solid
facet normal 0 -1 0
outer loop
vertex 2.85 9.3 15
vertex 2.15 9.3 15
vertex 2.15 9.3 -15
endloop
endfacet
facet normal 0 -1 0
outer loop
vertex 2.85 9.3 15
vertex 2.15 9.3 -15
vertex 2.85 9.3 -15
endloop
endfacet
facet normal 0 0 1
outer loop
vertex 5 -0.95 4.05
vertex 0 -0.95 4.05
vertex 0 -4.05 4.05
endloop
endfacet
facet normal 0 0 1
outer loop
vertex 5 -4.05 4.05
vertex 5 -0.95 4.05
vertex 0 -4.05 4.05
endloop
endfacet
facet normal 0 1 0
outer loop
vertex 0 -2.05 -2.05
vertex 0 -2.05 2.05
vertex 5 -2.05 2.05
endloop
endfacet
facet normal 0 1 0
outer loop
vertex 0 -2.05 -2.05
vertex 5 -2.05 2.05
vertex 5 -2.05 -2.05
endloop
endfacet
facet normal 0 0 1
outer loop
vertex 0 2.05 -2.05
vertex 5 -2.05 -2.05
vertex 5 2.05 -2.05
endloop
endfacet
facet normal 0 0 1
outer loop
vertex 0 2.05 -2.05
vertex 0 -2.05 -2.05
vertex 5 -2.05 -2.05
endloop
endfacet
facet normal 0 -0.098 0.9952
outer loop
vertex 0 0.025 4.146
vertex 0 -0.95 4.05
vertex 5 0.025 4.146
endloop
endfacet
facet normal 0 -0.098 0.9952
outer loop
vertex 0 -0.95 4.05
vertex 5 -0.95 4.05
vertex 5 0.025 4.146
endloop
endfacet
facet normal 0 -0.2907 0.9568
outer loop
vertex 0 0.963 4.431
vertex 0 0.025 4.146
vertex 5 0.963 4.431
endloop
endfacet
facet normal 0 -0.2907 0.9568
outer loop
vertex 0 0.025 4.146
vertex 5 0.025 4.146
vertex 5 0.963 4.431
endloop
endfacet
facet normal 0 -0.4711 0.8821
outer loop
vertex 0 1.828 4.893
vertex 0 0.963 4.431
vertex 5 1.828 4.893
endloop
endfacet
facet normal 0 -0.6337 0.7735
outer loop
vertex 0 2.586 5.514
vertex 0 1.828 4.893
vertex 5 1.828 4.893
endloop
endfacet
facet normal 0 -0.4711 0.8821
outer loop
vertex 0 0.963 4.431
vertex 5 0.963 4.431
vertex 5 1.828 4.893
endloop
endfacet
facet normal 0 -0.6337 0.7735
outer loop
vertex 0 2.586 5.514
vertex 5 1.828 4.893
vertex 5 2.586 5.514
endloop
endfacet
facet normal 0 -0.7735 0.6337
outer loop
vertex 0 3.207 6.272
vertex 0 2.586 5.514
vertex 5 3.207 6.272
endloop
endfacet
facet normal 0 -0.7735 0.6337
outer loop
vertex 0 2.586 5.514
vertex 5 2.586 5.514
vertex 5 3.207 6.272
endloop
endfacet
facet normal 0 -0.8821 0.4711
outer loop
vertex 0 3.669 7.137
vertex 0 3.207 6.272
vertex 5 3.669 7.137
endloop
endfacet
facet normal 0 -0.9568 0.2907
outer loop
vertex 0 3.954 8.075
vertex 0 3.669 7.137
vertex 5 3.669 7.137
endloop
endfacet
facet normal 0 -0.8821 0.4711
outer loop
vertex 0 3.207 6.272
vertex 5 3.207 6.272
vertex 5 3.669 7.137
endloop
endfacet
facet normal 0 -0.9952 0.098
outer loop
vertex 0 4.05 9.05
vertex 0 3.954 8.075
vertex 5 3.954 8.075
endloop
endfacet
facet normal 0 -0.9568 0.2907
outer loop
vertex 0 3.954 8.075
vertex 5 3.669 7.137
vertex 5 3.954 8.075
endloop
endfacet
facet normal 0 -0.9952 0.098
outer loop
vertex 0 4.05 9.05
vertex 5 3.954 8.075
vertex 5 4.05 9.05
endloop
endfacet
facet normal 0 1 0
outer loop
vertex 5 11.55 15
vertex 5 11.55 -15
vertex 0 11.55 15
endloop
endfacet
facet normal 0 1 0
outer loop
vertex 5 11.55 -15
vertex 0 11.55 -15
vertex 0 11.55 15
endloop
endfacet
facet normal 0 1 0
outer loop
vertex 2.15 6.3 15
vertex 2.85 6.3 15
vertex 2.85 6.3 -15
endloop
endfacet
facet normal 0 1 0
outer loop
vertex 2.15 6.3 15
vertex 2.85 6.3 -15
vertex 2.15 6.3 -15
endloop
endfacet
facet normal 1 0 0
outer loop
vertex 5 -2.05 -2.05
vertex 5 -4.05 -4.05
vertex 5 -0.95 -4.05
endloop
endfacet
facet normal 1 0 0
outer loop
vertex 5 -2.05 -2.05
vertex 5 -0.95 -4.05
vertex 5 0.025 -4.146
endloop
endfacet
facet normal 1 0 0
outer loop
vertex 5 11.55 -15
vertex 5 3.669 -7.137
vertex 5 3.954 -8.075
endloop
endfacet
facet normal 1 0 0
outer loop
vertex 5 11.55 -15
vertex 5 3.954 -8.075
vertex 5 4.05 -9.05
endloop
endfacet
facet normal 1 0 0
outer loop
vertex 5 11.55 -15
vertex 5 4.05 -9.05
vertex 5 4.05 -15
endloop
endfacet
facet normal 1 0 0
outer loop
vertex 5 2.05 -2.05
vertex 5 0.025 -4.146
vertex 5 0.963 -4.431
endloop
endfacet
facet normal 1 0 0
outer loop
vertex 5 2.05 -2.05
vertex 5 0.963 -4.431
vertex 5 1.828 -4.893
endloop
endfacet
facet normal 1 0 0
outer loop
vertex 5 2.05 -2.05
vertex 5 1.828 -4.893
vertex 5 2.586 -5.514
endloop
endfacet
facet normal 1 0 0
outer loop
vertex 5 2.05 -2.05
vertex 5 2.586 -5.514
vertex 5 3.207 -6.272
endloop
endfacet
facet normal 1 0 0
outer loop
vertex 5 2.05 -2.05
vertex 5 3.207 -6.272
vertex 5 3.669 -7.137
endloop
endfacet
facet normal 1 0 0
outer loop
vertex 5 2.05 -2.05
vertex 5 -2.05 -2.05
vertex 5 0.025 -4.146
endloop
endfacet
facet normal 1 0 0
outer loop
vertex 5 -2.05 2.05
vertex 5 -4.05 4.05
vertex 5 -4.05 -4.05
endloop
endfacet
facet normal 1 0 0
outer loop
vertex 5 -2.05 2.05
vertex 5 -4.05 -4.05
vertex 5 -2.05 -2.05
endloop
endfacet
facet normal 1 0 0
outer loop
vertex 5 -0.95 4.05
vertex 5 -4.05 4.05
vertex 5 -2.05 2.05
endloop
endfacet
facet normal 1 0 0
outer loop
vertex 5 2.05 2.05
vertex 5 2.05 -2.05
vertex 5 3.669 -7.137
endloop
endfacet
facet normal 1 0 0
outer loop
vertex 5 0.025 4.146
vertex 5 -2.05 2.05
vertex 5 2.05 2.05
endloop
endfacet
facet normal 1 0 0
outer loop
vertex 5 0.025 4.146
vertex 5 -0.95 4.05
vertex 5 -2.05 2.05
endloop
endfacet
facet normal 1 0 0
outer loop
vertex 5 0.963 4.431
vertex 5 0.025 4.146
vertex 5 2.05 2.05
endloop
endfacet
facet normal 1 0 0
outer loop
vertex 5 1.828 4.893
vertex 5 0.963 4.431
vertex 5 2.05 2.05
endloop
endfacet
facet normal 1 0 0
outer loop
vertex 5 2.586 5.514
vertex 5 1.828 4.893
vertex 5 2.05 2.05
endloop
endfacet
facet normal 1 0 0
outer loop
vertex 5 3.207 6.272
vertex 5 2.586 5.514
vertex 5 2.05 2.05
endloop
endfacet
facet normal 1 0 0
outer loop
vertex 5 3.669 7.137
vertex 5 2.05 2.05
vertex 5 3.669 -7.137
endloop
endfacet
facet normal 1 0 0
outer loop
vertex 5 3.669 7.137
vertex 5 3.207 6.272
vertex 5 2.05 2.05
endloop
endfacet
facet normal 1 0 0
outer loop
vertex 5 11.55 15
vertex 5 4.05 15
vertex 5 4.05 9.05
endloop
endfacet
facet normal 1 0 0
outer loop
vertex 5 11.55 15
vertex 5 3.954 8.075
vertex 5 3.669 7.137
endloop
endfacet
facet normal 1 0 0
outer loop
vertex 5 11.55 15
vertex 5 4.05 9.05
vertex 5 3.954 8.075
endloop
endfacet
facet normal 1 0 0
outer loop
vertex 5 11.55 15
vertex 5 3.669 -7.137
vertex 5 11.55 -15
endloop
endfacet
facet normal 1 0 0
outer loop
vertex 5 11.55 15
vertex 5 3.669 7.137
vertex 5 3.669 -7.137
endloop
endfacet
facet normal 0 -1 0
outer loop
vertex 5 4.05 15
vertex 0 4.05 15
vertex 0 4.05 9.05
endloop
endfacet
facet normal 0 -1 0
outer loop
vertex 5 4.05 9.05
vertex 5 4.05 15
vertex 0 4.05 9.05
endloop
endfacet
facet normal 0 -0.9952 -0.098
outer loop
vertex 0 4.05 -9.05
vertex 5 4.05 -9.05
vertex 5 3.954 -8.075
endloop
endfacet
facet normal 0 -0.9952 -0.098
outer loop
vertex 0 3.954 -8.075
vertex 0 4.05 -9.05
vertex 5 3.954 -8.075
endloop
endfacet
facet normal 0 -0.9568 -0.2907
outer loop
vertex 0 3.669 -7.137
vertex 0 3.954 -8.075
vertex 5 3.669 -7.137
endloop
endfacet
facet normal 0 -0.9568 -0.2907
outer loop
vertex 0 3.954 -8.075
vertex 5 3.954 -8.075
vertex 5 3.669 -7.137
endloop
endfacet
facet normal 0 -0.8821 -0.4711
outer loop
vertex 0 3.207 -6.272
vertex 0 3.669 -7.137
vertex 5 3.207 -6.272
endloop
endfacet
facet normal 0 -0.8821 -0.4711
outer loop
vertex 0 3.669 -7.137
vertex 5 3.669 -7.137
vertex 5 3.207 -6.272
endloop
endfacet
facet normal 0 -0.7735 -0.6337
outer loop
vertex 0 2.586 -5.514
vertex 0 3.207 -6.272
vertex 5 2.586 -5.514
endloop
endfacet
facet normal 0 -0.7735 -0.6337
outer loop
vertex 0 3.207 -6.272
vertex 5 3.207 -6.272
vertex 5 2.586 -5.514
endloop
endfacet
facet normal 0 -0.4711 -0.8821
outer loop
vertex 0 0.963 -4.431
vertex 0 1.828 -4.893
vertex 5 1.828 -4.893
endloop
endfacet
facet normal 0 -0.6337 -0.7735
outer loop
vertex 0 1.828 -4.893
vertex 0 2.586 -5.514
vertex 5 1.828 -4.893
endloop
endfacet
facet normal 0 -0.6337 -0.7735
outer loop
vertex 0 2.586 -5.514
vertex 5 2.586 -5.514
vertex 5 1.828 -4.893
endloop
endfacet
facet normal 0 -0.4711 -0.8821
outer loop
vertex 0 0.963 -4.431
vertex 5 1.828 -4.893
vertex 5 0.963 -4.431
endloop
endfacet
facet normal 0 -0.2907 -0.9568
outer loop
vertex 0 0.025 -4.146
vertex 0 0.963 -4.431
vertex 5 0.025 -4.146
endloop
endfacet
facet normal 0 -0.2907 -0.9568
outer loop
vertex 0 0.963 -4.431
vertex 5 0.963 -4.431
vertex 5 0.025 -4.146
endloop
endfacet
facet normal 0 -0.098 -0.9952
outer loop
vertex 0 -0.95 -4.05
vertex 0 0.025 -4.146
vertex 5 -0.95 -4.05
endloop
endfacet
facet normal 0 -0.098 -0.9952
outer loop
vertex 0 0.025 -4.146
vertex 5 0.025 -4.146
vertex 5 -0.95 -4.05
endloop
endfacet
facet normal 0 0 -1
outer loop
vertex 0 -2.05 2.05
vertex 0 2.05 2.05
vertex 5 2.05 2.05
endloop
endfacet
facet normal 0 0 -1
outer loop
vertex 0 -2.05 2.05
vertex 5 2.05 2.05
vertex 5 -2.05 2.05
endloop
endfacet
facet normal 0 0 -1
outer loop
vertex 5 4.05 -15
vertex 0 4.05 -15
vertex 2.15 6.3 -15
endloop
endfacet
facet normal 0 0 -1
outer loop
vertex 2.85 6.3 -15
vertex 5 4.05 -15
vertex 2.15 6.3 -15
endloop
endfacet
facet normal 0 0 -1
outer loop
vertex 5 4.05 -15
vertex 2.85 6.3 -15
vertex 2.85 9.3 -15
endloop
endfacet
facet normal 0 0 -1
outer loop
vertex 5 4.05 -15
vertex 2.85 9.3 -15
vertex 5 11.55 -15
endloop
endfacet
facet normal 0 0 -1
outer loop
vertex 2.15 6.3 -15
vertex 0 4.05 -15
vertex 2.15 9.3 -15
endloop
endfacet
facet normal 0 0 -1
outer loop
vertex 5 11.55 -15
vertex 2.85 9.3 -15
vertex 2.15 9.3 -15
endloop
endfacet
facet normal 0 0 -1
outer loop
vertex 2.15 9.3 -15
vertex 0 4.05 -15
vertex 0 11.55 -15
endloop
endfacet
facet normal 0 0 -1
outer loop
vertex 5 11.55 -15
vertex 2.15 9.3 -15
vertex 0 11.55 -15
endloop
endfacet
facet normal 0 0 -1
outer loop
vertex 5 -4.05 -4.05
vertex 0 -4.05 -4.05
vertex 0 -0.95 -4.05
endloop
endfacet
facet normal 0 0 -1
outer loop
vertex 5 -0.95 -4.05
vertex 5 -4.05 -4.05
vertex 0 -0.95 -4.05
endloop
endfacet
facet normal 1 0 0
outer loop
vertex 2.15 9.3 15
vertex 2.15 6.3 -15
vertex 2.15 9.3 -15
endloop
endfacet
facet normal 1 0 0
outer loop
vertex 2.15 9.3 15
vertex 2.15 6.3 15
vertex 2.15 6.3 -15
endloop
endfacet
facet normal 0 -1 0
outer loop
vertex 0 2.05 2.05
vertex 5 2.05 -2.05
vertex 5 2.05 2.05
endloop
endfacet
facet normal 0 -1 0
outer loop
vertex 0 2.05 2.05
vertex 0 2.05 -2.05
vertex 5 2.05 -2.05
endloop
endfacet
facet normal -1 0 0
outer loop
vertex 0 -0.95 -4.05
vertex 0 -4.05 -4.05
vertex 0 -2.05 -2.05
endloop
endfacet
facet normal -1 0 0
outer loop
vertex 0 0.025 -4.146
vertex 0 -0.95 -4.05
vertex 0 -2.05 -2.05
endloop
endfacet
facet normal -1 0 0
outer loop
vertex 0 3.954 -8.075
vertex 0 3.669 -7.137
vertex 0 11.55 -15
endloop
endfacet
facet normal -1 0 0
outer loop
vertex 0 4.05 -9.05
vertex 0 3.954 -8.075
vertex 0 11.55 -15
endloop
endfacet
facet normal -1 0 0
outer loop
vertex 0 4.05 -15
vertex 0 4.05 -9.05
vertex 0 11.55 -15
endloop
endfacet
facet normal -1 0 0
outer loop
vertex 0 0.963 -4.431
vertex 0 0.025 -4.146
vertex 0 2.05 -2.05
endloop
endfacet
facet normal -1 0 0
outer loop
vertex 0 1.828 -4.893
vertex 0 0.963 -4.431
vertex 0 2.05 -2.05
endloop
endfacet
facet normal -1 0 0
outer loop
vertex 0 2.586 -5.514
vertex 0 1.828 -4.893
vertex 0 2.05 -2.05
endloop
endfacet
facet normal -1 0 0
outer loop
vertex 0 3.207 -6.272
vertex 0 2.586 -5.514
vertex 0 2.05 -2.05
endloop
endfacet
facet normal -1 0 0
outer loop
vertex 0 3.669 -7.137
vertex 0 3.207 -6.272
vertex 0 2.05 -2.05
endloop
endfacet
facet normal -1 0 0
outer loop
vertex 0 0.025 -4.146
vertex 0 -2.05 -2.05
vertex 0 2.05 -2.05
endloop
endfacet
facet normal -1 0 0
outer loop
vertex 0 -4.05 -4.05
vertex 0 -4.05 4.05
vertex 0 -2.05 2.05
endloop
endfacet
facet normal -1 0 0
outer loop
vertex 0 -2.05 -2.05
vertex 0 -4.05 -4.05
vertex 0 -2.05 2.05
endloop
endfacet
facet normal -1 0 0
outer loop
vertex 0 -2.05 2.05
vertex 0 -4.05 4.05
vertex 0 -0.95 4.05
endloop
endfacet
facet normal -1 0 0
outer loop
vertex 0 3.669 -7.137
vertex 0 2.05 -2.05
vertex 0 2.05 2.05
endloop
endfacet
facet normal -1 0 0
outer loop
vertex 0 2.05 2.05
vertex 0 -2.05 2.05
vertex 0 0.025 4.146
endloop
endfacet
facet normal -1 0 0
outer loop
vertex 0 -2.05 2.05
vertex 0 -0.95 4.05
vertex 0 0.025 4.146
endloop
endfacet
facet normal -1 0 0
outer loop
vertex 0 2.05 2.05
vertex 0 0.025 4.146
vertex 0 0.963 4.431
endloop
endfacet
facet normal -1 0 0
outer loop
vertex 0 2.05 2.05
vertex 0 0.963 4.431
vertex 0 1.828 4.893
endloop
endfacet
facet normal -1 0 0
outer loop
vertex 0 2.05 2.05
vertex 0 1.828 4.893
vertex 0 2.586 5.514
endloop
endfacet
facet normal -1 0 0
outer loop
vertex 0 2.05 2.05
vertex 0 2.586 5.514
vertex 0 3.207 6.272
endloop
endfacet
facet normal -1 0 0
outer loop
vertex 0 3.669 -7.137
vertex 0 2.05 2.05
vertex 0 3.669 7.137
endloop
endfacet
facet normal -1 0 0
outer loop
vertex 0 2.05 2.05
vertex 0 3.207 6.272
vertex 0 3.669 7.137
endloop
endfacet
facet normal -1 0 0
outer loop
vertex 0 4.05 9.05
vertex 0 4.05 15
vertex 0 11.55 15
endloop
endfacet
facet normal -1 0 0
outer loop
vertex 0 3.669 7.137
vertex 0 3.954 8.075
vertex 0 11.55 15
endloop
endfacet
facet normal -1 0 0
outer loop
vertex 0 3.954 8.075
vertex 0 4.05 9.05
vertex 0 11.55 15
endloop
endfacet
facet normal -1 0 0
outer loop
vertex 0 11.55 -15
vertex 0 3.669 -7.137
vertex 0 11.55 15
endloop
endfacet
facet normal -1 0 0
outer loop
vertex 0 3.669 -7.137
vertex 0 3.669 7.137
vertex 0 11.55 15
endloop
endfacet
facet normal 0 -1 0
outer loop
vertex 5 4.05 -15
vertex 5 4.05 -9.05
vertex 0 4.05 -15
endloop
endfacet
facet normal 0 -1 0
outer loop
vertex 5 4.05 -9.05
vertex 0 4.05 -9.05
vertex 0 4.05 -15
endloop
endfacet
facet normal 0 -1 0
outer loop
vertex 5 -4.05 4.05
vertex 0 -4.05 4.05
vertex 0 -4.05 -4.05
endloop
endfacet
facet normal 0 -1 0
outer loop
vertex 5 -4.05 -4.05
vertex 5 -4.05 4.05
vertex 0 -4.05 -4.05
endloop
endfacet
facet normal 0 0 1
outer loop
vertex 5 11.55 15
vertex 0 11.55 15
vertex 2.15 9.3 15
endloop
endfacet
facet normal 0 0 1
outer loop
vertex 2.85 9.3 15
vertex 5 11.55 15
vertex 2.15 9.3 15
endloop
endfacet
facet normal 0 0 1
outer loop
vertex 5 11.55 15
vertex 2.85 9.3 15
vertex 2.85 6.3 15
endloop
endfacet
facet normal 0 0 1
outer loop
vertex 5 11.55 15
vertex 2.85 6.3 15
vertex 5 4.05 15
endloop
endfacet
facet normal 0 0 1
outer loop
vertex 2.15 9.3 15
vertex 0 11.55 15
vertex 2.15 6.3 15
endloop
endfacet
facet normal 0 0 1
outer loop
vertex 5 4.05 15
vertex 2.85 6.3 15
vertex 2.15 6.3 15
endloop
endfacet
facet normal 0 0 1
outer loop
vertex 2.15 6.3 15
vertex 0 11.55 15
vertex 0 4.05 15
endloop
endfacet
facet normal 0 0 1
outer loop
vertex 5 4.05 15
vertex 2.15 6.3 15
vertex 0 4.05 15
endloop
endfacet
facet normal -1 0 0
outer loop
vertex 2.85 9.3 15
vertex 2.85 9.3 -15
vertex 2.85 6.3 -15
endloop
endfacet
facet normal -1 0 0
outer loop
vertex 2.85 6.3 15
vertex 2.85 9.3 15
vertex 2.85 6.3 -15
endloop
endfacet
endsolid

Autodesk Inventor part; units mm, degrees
ref_plane "YZ Plane" through (0, 0, 0) normal (1, 0, 0) x (0, 1, 0)
ref_plane "XZ Plane" through (0, 0, 0) normal (0, 1, 0) x (-1, 0, 0)
ref_plane "XY Plane" through (0, 0, 0) normal (0, 0, 1) x (1, 0, 0)
sketch "Sketch1" plane through (0, 0, 0) normal (1, 0, 0) x (0, 1, 0)
  line L0 (4.05, 4.05) -> (-4.05, 4.05)
  line L1 (-4.05, 4.05) -> (-4.05, -4.05)
  line L2 (-4.05, -4.05) -> (4.05, -4.05)
  line L3 (4.05, -4.05) -> (4.05, 4.05)
  line L4 (11.55, 15) -> (4.05, 15)
  line L5 (4.05, 15) -> (4.05, -15)
  line L6 (4.05, -15) -> (11.55, -15)
  line L7 (11.55, -15) -> (11.55, 15)
  line L8 (4.05, 4.05) -> (-4.05, -4.05) construction
  line L9 (4.05, -4.05) -> (-4.05, 4.05) construction
  line L10 (2.05, 2.05) -> (-2.05, 2.05)
  line L11 (-2.05, 2.05) -> (-2.05, -2.05)
  line L12 (-2.05, -2.05) -> (2.05, -2.05)
  line L13 (2.05, -2.05) -> (2.05, 2.05)
  line L14 (2.05, 2.05) -> (-2.05, -2.05) construction
  line L15 (-2.05, 2.05) -> (2.05, -2.05) construction
  point P0 (4.05, 4.05)
  point P1 (0, 0)
  point P2 (0, 0)
  point P3 (0, 0)
  dimension "d0" = 8.1
  dimension "d3" = 8.1
  dimension "d22" = 10.95
  dimension "d24" = 30
  dimension "d25" = 7.5
  dimension "d55" = 10.95
  dimension "d65" = 4.1
  dimension "d66" = 4.1
extrude "Extrusion1" add sketch "Sketch1" along normal blind 5
sketch "Sketch5" plane through (0, 4.05, 15) normal (0, 0, 1) x (1, 0, 0)
  line L0 (2.15, 5.25) -> (2.85, 5.25)
  line L1 (2.85, 5.25) -> (2.85, 2.25)
  line L2 (2.85, 2.25) -> (2.15, 2.25)
  line L3 (2.15, 2.25) -> (2.15, 5.25)
  line L4 (0, 0) -> (5, 0) projected
  line L5 (0, 7.5) -> (0, 0) projected
  point P0 (0, -4.05)
  dimension "d86" = 3
  dimension "d87" = 0.7
  dimension "d88" = 2.25
  dimension "d89" = 2.15
extrude "Extrusion4" cut sketch "Sketch5" against normal through all
fillet "Fillet3" radius 5 2 edges at (2.5, 4.05, 4.05) (2.5, 4.05, -4.05)
equation "\"d3\" = d0"
equation "\"d22\" = d55"
properties part number "fuselage_wing_interface_2" material "ABS Plastic"
